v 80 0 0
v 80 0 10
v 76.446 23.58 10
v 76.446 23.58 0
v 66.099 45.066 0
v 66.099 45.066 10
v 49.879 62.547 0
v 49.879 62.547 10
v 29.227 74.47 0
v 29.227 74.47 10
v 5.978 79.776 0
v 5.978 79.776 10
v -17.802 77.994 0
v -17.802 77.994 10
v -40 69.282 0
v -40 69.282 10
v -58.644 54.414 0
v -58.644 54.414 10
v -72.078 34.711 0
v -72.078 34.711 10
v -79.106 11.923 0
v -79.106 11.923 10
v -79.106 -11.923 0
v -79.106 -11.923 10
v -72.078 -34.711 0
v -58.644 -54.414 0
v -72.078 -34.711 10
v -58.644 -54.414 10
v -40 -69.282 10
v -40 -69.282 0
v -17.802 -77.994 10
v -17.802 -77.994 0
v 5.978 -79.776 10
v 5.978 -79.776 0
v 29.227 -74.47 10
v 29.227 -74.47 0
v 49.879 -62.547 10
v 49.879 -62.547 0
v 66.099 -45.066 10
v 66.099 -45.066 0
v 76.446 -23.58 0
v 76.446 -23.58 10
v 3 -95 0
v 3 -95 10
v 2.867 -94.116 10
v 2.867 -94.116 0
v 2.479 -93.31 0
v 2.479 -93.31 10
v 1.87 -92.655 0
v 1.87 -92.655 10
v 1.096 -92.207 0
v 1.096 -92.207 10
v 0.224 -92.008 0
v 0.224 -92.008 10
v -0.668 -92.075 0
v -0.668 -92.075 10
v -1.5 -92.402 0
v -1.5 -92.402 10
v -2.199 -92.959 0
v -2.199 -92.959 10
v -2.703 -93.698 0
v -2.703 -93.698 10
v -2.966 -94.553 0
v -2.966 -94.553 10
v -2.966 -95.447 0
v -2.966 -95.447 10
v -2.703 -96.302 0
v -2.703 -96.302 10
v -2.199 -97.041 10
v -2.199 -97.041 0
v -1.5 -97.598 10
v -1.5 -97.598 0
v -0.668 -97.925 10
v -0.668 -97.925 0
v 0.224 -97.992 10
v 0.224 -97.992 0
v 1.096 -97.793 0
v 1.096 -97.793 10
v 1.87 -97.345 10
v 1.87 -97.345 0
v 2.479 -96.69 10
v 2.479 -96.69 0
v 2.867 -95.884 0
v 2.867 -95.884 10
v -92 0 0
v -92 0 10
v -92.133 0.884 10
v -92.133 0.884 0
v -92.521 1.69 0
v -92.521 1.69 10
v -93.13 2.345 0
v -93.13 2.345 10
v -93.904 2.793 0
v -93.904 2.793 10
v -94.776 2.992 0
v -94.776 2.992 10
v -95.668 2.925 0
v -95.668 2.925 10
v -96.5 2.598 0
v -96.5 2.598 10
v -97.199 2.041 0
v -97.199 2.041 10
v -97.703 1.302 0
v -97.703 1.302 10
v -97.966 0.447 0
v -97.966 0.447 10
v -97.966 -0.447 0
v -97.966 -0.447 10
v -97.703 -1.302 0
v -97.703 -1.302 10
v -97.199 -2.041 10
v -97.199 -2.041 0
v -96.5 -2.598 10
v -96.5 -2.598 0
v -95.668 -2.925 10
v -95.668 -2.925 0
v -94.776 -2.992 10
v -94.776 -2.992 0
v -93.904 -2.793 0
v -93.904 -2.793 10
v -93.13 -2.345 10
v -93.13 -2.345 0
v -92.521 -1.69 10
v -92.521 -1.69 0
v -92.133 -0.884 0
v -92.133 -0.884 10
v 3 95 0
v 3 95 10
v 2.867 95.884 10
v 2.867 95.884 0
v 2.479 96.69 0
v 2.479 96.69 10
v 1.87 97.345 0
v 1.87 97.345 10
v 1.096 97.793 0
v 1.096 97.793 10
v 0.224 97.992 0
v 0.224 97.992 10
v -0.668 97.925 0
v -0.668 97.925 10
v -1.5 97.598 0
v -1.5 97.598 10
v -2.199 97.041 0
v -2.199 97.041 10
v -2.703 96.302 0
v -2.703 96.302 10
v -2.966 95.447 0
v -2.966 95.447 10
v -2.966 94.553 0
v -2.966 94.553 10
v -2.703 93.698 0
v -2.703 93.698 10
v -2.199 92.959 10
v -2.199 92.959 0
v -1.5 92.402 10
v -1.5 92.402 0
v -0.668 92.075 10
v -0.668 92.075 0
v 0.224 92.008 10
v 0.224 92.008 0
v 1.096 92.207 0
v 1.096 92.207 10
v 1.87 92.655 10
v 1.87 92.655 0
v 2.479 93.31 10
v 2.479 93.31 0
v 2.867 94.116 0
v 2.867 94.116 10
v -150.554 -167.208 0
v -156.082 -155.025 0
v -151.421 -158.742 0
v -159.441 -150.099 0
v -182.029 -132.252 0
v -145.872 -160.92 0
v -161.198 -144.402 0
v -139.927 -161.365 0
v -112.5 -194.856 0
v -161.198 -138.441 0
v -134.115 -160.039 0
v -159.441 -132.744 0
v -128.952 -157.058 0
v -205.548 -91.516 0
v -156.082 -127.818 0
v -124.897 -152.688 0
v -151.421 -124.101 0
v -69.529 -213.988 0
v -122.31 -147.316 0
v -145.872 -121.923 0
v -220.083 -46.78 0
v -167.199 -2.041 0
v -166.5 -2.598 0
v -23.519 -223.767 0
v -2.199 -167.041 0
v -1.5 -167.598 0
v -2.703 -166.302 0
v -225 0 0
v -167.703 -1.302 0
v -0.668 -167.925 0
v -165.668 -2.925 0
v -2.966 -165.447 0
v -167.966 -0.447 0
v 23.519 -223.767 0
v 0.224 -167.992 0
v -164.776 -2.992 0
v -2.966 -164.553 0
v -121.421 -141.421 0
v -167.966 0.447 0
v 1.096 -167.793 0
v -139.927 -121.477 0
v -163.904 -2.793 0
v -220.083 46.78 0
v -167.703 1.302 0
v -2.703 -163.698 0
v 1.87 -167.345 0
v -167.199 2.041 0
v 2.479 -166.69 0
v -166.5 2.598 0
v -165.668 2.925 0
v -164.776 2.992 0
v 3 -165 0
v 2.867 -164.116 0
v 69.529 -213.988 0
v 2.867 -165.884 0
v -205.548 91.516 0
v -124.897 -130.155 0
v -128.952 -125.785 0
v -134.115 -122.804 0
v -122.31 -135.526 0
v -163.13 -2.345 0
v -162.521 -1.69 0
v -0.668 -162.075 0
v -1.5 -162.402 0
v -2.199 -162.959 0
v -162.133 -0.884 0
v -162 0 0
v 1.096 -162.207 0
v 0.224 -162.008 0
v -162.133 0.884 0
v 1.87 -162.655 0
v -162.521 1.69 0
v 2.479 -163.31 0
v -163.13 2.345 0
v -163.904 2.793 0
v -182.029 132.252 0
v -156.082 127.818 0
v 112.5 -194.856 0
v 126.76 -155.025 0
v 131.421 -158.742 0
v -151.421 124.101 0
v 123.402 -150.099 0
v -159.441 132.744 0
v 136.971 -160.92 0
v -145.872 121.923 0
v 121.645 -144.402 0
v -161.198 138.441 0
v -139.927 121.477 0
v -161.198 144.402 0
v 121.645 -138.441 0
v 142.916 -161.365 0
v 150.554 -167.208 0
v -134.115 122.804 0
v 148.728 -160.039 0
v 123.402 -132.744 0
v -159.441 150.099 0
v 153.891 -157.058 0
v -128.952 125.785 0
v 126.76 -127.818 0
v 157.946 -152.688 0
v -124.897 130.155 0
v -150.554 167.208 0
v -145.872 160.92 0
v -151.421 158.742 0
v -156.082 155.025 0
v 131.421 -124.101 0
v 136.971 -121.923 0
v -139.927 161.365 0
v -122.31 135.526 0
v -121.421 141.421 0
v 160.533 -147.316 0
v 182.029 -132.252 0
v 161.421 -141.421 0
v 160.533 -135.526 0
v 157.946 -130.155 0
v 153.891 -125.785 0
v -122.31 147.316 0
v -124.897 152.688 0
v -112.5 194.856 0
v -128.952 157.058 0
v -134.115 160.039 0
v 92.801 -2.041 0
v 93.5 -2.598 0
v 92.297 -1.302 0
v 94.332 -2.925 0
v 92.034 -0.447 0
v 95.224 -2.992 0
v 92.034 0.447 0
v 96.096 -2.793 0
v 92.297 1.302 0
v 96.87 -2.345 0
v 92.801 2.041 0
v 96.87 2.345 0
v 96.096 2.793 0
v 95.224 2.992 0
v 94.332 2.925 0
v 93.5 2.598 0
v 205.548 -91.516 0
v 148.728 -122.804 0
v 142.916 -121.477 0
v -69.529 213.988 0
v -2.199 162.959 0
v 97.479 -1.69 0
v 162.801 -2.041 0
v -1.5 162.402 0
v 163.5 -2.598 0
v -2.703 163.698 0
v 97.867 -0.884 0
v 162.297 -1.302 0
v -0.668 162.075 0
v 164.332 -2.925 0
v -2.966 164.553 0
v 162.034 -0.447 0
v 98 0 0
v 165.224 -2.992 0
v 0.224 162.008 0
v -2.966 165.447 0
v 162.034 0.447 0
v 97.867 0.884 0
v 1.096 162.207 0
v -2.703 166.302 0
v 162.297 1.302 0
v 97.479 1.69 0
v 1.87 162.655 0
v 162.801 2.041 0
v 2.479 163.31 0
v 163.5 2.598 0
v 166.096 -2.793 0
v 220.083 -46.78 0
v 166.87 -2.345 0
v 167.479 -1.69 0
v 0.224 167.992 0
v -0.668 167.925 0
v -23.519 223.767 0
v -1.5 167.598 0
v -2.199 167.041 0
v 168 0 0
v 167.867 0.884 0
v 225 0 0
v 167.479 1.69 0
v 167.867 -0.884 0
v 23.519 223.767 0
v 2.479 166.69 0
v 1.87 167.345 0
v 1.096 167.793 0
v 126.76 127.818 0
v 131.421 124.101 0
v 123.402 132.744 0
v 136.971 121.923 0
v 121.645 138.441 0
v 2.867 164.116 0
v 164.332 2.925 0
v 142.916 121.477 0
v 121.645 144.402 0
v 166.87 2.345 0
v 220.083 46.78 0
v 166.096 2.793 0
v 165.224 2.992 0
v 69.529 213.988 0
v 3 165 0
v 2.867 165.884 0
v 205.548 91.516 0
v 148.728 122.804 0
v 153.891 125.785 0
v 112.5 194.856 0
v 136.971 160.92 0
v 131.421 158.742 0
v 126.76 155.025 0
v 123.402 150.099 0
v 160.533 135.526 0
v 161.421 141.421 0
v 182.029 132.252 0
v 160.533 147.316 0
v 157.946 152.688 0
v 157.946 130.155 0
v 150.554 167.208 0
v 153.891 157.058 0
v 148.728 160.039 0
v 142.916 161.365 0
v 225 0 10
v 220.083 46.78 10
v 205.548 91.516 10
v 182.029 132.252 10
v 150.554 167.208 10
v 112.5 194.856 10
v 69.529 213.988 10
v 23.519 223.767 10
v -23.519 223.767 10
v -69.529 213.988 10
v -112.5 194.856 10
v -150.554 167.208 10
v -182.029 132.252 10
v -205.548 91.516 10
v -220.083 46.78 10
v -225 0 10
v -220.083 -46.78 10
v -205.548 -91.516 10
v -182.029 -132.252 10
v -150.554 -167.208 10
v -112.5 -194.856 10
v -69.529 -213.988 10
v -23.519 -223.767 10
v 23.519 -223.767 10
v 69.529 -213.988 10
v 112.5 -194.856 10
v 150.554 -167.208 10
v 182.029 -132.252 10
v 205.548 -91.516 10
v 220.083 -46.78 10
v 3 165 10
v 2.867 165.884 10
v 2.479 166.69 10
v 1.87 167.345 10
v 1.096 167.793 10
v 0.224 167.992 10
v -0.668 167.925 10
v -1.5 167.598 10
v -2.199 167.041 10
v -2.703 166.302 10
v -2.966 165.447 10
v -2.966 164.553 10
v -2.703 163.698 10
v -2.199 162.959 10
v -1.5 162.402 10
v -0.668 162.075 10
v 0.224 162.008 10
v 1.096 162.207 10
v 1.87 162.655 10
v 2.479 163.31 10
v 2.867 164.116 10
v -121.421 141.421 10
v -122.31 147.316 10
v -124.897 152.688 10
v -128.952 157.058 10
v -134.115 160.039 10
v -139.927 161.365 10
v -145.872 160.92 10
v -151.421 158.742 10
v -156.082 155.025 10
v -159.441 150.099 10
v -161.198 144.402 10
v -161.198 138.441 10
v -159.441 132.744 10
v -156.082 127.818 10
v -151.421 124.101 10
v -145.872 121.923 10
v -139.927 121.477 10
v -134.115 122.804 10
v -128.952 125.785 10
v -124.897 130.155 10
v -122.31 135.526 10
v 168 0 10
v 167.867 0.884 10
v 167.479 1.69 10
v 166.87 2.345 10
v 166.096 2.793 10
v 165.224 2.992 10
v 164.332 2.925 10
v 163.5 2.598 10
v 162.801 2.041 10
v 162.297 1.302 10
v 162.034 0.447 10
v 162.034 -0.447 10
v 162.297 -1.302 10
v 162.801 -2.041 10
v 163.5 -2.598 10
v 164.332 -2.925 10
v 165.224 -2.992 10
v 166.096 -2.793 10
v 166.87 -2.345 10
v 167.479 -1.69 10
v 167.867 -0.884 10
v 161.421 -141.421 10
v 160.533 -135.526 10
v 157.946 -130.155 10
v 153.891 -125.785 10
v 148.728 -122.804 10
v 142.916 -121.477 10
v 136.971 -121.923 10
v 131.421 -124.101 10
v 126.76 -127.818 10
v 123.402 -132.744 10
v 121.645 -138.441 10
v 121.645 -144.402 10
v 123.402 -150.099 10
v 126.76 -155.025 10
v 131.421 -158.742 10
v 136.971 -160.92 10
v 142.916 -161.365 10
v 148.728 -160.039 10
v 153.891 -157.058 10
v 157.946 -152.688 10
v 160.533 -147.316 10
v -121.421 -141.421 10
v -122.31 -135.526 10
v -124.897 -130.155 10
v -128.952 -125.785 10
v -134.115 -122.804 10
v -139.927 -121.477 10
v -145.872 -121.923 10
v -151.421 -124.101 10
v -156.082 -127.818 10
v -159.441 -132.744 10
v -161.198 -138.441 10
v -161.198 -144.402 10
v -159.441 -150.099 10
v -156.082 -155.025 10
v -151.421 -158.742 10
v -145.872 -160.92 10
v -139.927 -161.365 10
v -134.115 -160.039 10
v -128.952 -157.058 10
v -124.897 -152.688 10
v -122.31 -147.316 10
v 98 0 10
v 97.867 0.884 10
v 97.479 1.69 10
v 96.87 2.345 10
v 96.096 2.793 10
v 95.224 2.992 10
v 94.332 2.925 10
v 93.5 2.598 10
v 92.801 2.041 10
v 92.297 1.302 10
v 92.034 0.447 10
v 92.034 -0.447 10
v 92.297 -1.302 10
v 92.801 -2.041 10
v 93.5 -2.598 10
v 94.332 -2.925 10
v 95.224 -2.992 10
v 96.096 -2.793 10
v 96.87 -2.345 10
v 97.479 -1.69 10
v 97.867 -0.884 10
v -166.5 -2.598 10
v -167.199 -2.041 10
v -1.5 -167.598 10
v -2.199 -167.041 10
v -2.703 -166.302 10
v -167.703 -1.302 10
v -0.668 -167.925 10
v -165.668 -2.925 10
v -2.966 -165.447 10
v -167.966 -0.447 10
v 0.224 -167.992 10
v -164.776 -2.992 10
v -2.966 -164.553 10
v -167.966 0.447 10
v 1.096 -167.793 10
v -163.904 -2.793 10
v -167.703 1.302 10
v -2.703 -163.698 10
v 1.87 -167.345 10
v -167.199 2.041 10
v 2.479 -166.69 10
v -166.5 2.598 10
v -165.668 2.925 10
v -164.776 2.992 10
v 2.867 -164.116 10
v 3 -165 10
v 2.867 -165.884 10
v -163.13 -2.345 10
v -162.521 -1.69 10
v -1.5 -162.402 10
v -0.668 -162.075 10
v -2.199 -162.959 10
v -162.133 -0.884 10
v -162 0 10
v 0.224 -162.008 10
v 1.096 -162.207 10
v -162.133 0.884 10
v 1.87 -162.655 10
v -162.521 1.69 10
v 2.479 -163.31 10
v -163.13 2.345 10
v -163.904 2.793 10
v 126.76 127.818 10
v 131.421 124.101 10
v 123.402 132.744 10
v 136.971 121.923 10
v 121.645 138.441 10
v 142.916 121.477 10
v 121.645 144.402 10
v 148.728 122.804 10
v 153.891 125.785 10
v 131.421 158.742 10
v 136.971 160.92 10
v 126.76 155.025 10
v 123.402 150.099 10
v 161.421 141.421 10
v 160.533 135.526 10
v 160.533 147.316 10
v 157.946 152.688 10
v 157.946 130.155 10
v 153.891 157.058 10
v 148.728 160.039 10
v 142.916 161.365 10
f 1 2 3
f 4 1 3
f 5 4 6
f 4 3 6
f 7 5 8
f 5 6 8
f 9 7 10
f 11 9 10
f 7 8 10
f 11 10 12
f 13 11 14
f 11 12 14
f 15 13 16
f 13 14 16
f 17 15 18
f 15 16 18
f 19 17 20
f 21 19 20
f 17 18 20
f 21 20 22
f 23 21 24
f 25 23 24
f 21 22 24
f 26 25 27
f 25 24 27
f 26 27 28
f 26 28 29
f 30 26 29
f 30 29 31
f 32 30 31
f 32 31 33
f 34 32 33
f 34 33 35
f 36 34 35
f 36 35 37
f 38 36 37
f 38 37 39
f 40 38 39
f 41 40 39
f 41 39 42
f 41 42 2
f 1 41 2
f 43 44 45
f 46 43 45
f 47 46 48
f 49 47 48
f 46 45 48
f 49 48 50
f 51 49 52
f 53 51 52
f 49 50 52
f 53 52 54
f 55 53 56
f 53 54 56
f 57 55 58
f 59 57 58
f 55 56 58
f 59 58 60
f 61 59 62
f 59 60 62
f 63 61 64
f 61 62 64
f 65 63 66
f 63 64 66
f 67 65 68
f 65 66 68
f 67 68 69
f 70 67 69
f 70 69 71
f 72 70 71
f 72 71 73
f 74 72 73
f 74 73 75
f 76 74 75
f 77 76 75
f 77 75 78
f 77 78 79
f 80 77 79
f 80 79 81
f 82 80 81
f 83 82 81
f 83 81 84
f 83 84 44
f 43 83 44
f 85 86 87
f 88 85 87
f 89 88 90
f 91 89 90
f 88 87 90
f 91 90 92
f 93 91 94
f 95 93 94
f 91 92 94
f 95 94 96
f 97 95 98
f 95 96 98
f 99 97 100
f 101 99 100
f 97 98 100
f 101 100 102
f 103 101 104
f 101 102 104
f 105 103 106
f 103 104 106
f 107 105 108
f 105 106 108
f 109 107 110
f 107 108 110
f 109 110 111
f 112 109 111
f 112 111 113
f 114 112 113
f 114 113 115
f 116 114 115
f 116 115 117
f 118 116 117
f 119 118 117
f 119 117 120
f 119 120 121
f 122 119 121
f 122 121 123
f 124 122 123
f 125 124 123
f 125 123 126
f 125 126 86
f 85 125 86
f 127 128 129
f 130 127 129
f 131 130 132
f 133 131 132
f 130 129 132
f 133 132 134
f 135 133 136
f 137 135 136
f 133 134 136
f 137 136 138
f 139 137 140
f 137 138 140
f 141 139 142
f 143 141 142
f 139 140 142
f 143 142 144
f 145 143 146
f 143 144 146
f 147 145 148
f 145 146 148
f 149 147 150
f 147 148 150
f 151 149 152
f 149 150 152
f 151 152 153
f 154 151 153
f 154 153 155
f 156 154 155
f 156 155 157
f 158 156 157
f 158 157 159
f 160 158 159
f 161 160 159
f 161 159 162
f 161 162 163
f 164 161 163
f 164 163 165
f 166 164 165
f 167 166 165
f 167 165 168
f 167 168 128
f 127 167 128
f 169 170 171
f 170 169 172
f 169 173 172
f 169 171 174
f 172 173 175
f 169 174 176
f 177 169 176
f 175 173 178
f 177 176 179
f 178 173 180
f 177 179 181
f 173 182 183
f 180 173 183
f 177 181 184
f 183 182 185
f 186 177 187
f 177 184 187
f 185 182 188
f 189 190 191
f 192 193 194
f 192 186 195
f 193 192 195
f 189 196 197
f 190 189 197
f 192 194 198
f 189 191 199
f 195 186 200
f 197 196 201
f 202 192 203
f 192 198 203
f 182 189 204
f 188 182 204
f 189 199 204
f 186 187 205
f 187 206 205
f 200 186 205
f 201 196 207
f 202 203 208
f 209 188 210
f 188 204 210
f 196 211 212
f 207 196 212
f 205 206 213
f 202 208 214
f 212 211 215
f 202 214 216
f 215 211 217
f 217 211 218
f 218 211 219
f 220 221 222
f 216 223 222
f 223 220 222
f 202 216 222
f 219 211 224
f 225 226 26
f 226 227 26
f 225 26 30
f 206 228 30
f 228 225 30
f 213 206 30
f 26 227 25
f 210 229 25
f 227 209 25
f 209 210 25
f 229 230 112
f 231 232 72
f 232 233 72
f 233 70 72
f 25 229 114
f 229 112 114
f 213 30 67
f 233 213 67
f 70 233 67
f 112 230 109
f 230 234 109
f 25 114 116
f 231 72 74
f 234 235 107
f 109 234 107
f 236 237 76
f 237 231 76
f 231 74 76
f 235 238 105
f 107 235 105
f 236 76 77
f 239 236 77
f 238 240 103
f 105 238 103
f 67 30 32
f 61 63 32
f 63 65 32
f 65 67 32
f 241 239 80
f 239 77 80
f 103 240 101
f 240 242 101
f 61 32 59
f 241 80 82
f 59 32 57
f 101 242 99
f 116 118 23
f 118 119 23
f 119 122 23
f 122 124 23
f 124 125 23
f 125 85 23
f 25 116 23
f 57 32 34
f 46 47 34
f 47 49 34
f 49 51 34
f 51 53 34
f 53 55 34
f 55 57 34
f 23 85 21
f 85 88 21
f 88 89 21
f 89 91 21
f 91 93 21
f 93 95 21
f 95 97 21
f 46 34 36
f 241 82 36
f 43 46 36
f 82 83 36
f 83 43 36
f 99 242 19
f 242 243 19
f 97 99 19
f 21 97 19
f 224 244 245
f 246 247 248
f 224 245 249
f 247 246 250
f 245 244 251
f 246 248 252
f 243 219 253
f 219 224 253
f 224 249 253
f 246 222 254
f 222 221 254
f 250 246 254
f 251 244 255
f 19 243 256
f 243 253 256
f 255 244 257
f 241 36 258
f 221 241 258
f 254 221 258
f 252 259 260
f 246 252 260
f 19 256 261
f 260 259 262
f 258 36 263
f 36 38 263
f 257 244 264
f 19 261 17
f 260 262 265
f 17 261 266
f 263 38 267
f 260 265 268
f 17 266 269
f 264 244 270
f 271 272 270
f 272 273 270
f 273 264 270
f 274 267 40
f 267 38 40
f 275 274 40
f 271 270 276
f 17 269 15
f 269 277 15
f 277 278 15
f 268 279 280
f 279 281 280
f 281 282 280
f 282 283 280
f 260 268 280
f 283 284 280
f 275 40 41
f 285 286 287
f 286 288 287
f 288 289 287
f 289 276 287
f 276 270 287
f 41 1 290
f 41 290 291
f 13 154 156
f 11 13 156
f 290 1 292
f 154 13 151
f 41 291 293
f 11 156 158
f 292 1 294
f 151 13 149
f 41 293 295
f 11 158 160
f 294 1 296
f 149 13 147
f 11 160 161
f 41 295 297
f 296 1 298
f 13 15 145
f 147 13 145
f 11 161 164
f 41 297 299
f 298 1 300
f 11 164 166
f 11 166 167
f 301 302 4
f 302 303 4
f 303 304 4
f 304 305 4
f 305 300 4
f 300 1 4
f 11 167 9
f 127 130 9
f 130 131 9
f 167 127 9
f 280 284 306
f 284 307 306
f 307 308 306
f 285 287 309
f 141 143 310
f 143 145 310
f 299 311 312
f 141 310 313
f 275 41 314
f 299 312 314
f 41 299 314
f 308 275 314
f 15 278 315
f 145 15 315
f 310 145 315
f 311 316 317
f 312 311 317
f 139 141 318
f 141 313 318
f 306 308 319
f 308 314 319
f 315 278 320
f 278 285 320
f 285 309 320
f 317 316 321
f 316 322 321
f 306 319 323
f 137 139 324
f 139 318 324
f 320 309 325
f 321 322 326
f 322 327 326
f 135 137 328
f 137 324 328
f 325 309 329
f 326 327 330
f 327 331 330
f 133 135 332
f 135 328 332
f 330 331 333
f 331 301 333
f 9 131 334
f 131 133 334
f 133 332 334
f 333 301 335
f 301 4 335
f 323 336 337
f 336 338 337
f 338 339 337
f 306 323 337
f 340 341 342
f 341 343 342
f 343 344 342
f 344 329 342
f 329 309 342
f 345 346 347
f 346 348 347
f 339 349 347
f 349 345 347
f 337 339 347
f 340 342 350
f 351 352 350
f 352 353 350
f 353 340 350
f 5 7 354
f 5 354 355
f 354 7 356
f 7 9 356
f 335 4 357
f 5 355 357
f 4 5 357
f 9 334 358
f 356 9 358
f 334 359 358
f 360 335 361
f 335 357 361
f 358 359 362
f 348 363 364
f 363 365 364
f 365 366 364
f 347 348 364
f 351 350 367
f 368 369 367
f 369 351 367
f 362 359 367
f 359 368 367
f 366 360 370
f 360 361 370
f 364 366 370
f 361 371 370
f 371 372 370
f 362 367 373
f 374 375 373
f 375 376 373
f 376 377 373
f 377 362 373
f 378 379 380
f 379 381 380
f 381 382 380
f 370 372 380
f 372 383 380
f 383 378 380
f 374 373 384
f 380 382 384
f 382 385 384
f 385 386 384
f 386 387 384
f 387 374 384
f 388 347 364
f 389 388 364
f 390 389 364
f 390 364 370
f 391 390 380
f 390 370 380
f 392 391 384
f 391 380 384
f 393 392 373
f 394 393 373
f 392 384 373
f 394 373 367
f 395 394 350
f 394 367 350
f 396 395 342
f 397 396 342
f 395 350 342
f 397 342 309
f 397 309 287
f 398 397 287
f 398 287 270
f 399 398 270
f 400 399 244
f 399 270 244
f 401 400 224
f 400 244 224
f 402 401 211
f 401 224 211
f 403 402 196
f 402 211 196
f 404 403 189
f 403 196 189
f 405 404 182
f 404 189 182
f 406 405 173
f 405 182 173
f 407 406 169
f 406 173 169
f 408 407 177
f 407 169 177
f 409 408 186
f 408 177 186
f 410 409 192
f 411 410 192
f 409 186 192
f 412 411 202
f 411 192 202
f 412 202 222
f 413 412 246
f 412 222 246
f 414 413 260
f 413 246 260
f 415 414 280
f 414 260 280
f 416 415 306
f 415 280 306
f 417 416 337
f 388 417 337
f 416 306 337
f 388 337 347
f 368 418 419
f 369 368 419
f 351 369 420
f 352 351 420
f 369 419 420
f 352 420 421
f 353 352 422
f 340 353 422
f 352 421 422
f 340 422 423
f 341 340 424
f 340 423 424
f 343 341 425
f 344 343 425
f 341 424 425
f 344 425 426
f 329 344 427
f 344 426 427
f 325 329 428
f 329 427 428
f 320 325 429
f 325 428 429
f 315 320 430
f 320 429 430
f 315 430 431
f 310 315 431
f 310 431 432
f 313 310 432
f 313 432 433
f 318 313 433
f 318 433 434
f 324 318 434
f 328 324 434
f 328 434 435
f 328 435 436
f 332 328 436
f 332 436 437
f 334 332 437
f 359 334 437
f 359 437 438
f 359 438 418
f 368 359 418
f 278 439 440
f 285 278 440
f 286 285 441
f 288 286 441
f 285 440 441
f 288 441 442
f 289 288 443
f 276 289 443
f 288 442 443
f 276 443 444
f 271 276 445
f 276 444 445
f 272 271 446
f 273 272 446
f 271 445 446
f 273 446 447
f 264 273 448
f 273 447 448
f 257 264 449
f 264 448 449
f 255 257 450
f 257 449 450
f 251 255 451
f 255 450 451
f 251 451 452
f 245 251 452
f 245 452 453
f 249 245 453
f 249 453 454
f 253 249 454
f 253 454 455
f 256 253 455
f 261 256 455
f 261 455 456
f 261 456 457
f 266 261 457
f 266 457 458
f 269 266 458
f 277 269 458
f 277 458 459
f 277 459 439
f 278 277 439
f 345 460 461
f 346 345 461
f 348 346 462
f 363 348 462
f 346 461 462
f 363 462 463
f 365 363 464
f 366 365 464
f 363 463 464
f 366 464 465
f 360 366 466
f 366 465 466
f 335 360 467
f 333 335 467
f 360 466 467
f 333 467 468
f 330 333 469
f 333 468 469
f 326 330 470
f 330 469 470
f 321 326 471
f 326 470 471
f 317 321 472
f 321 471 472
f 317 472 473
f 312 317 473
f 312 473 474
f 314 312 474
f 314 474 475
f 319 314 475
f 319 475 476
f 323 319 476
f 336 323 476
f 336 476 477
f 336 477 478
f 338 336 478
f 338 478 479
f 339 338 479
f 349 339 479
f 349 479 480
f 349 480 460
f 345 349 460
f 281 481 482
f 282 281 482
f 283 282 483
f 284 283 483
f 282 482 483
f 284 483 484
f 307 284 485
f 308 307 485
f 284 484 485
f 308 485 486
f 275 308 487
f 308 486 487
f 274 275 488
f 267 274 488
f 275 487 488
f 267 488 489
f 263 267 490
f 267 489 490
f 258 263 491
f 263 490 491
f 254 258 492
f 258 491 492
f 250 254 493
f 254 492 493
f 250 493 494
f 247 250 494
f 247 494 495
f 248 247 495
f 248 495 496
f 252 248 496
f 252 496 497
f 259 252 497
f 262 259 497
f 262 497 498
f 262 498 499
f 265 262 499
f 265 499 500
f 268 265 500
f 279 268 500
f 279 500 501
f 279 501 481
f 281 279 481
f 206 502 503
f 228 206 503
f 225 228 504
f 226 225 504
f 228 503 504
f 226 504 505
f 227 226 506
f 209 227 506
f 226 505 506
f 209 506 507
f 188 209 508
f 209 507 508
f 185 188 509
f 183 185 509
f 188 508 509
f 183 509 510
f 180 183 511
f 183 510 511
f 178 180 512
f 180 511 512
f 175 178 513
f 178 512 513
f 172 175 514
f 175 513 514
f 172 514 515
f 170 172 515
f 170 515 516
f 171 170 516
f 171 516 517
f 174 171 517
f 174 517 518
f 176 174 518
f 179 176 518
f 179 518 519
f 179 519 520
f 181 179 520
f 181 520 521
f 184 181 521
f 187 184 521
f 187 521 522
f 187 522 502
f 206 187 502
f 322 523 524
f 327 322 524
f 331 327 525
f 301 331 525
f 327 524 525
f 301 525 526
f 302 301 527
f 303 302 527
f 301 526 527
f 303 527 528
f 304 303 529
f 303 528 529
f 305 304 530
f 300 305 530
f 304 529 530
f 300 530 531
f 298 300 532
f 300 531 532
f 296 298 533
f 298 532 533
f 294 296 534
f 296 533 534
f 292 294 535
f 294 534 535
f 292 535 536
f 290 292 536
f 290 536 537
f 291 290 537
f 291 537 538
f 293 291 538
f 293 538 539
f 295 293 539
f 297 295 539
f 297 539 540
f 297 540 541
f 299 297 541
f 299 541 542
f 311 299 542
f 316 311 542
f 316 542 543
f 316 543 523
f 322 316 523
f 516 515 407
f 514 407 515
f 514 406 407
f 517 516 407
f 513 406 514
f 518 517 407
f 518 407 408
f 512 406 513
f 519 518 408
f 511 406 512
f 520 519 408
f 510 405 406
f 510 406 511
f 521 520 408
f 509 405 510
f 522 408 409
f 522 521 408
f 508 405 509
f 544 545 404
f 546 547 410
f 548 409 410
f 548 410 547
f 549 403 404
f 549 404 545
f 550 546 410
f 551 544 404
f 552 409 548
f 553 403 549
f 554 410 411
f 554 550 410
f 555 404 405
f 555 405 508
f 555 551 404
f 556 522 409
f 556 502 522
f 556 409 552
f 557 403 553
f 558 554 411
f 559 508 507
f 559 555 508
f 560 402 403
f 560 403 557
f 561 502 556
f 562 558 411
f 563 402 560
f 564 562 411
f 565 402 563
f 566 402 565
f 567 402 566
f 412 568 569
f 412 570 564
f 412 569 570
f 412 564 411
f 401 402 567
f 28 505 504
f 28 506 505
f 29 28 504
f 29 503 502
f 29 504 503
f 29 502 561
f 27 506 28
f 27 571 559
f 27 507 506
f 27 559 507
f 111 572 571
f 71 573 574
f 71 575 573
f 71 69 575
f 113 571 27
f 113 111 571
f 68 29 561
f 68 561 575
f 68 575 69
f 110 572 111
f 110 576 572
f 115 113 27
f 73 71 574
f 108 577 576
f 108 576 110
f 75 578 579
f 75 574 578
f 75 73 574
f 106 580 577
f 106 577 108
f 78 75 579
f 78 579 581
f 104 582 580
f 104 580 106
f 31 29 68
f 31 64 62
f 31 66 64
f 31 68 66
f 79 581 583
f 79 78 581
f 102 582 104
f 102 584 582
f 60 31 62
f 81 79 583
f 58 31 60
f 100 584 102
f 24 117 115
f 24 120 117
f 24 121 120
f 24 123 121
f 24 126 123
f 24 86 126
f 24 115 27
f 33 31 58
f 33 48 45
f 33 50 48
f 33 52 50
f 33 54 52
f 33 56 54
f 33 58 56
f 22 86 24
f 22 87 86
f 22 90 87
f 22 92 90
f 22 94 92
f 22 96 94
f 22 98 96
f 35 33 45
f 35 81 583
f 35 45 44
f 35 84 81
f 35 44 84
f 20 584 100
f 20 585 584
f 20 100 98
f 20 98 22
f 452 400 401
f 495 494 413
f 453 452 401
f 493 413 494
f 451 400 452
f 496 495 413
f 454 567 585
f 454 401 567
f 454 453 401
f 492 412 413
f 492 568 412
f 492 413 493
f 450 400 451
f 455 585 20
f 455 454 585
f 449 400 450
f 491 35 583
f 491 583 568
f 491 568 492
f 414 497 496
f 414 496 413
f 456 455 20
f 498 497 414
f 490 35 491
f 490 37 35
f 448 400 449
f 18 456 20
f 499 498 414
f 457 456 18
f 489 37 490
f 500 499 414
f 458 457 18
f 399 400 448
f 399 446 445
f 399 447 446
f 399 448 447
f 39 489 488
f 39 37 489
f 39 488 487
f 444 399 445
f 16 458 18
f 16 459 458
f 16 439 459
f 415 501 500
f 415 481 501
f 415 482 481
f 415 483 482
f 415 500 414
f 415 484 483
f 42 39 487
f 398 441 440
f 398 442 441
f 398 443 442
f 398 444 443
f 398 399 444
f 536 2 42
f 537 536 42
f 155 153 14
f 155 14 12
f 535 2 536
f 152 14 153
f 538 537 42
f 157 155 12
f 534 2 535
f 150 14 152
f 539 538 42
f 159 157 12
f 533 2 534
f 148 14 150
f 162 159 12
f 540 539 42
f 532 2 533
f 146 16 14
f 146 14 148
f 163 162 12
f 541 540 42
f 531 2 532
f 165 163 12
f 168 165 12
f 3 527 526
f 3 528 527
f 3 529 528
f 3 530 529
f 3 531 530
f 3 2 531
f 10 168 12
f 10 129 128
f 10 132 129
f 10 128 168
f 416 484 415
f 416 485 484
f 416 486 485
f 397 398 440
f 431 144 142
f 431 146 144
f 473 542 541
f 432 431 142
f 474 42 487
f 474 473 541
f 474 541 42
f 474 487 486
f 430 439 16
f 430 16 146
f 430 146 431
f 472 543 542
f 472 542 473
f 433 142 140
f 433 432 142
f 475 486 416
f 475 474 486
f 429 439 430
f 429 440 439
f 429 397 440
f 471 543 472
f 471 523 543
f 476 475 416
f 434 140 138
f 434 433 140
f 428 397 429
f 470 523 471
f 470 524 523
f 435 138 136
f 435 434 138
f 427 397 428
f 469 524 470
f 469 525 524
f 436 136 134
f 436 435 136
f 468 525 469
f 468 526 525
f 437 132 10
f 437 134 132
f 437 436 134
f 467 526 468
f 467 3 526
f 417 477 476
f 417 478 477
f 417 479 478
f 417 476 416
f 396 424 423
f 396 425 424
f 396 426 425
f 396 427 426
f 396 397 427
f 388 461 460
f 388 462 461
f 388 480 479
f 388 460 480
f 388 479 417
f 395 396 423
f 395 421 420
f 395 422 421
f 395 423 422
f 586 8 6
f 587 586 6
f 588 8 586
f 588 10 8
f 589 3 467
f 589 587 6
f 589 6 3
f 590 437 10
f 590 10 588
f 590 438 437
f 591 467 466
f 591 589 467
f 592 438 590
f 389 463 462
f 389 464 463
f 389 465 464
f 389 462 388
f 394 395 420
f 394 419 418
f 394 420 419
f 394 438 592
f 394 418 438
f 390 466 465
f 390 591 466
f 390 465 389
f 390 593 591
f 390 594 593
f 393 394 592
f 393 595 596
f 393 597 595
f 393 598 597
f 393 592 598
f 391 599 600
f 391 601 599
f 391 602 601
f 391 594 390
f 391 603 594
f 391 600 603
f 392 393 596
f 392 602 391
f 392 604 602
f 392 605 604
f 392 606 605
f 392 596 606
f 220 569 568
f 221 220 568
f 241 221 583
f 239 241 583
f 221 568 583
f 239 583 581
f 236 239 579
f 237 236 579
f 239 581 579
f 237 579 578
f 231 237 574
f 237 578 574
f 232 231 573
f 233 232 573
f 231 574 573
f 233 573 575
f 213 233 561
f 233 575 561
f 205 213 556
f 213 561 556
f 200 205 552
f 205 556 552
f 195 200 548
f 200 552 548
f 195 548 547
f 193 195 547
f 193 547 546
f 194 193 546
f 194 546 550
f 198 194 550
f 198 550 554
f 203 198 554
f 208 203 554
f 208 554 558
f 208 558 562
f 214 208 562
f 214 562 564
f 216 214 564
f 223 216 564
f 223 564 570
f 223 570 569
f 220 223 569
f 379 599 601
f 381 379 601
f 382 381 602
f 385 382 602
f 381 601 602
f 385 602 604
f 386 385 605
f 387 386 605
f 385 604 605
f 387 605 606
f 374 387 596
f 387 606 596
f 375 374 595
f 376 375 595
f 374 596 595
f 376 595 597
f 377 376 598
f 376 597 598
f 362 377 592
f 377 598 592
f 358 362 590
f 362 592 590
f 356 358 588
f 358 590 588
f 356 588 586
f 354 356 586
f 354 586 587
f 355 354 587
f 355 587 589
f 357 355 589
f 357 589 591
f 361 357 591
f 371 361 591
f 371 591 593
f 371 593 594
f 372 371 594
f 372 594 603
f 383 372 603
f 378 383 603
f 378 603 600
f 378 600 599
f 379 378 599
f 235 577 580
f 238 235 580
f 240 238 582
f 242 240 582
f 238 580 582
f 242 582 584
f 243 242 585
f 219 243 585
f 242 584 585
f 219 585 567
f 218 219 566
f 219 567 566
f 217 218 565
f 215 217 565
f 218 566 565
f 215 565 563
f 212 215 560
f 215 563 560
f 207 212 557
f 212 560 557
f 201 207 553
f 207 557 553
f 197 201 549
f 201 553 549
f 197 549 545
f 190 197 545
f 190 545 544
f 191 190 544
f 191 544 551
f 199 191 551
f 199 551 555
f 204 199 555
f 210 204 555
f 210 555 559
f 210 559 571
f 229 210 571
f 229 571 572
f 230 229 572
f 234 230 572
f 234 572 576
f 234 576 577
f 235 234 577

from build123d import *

# Parameters (mm, degrees)
F0_R     = 225
F1_DEPTH = 10
F2_R     = 80
F2_R_2   = 3
F2_R_3   = 20
F3_DEPTH = 10.001


with BuildPart() as f1:
    # F0 (on Top) → F1 (new body)
    with BuildSketch(Plane.XY):
        Circle(F0_R)
    extrude(amount=F1_DEPTH)

    # F2 (on face) → F3 (cut, through all)
    with BuildSketch(Plane.XY.offset(10)):
        Circle(F2_R)
        with Locations((-95, 0)):
            Circle(F2_R_2)
        with Locations((-165, 0)):
            Circle(F2_R_2)
        with Locations((0, -95)):
            Circle(F2_R_2)
        with Locations((0, -165)):
            Circle(F2_R_2)
        with Locations((0, 165)):
            Circle(F2_R_2)
        with Locations((0, 95)):
            Circle(F2_R_2)
        with Locations((95, 0)):
            Circle(F2_R_2)
        with Locations((165, 0)):
            Circle(F2_R_2)
        with Locations((-141.421356, -141.421356)):
            Circle(F2_R_3)
        with Locations((-141.421356, 141.421356)):
            Circle(F2_R_3)
        with Locations((141.421356, -141.421356)):
            Circle(F2_R_3)
        with Locations((141.421356, 141.421356)):
            Circle(F2_R_3)
    extrude(amount=-F3_DEPTH, mode=Mode.SUBTRACT)


solid = f1.part
